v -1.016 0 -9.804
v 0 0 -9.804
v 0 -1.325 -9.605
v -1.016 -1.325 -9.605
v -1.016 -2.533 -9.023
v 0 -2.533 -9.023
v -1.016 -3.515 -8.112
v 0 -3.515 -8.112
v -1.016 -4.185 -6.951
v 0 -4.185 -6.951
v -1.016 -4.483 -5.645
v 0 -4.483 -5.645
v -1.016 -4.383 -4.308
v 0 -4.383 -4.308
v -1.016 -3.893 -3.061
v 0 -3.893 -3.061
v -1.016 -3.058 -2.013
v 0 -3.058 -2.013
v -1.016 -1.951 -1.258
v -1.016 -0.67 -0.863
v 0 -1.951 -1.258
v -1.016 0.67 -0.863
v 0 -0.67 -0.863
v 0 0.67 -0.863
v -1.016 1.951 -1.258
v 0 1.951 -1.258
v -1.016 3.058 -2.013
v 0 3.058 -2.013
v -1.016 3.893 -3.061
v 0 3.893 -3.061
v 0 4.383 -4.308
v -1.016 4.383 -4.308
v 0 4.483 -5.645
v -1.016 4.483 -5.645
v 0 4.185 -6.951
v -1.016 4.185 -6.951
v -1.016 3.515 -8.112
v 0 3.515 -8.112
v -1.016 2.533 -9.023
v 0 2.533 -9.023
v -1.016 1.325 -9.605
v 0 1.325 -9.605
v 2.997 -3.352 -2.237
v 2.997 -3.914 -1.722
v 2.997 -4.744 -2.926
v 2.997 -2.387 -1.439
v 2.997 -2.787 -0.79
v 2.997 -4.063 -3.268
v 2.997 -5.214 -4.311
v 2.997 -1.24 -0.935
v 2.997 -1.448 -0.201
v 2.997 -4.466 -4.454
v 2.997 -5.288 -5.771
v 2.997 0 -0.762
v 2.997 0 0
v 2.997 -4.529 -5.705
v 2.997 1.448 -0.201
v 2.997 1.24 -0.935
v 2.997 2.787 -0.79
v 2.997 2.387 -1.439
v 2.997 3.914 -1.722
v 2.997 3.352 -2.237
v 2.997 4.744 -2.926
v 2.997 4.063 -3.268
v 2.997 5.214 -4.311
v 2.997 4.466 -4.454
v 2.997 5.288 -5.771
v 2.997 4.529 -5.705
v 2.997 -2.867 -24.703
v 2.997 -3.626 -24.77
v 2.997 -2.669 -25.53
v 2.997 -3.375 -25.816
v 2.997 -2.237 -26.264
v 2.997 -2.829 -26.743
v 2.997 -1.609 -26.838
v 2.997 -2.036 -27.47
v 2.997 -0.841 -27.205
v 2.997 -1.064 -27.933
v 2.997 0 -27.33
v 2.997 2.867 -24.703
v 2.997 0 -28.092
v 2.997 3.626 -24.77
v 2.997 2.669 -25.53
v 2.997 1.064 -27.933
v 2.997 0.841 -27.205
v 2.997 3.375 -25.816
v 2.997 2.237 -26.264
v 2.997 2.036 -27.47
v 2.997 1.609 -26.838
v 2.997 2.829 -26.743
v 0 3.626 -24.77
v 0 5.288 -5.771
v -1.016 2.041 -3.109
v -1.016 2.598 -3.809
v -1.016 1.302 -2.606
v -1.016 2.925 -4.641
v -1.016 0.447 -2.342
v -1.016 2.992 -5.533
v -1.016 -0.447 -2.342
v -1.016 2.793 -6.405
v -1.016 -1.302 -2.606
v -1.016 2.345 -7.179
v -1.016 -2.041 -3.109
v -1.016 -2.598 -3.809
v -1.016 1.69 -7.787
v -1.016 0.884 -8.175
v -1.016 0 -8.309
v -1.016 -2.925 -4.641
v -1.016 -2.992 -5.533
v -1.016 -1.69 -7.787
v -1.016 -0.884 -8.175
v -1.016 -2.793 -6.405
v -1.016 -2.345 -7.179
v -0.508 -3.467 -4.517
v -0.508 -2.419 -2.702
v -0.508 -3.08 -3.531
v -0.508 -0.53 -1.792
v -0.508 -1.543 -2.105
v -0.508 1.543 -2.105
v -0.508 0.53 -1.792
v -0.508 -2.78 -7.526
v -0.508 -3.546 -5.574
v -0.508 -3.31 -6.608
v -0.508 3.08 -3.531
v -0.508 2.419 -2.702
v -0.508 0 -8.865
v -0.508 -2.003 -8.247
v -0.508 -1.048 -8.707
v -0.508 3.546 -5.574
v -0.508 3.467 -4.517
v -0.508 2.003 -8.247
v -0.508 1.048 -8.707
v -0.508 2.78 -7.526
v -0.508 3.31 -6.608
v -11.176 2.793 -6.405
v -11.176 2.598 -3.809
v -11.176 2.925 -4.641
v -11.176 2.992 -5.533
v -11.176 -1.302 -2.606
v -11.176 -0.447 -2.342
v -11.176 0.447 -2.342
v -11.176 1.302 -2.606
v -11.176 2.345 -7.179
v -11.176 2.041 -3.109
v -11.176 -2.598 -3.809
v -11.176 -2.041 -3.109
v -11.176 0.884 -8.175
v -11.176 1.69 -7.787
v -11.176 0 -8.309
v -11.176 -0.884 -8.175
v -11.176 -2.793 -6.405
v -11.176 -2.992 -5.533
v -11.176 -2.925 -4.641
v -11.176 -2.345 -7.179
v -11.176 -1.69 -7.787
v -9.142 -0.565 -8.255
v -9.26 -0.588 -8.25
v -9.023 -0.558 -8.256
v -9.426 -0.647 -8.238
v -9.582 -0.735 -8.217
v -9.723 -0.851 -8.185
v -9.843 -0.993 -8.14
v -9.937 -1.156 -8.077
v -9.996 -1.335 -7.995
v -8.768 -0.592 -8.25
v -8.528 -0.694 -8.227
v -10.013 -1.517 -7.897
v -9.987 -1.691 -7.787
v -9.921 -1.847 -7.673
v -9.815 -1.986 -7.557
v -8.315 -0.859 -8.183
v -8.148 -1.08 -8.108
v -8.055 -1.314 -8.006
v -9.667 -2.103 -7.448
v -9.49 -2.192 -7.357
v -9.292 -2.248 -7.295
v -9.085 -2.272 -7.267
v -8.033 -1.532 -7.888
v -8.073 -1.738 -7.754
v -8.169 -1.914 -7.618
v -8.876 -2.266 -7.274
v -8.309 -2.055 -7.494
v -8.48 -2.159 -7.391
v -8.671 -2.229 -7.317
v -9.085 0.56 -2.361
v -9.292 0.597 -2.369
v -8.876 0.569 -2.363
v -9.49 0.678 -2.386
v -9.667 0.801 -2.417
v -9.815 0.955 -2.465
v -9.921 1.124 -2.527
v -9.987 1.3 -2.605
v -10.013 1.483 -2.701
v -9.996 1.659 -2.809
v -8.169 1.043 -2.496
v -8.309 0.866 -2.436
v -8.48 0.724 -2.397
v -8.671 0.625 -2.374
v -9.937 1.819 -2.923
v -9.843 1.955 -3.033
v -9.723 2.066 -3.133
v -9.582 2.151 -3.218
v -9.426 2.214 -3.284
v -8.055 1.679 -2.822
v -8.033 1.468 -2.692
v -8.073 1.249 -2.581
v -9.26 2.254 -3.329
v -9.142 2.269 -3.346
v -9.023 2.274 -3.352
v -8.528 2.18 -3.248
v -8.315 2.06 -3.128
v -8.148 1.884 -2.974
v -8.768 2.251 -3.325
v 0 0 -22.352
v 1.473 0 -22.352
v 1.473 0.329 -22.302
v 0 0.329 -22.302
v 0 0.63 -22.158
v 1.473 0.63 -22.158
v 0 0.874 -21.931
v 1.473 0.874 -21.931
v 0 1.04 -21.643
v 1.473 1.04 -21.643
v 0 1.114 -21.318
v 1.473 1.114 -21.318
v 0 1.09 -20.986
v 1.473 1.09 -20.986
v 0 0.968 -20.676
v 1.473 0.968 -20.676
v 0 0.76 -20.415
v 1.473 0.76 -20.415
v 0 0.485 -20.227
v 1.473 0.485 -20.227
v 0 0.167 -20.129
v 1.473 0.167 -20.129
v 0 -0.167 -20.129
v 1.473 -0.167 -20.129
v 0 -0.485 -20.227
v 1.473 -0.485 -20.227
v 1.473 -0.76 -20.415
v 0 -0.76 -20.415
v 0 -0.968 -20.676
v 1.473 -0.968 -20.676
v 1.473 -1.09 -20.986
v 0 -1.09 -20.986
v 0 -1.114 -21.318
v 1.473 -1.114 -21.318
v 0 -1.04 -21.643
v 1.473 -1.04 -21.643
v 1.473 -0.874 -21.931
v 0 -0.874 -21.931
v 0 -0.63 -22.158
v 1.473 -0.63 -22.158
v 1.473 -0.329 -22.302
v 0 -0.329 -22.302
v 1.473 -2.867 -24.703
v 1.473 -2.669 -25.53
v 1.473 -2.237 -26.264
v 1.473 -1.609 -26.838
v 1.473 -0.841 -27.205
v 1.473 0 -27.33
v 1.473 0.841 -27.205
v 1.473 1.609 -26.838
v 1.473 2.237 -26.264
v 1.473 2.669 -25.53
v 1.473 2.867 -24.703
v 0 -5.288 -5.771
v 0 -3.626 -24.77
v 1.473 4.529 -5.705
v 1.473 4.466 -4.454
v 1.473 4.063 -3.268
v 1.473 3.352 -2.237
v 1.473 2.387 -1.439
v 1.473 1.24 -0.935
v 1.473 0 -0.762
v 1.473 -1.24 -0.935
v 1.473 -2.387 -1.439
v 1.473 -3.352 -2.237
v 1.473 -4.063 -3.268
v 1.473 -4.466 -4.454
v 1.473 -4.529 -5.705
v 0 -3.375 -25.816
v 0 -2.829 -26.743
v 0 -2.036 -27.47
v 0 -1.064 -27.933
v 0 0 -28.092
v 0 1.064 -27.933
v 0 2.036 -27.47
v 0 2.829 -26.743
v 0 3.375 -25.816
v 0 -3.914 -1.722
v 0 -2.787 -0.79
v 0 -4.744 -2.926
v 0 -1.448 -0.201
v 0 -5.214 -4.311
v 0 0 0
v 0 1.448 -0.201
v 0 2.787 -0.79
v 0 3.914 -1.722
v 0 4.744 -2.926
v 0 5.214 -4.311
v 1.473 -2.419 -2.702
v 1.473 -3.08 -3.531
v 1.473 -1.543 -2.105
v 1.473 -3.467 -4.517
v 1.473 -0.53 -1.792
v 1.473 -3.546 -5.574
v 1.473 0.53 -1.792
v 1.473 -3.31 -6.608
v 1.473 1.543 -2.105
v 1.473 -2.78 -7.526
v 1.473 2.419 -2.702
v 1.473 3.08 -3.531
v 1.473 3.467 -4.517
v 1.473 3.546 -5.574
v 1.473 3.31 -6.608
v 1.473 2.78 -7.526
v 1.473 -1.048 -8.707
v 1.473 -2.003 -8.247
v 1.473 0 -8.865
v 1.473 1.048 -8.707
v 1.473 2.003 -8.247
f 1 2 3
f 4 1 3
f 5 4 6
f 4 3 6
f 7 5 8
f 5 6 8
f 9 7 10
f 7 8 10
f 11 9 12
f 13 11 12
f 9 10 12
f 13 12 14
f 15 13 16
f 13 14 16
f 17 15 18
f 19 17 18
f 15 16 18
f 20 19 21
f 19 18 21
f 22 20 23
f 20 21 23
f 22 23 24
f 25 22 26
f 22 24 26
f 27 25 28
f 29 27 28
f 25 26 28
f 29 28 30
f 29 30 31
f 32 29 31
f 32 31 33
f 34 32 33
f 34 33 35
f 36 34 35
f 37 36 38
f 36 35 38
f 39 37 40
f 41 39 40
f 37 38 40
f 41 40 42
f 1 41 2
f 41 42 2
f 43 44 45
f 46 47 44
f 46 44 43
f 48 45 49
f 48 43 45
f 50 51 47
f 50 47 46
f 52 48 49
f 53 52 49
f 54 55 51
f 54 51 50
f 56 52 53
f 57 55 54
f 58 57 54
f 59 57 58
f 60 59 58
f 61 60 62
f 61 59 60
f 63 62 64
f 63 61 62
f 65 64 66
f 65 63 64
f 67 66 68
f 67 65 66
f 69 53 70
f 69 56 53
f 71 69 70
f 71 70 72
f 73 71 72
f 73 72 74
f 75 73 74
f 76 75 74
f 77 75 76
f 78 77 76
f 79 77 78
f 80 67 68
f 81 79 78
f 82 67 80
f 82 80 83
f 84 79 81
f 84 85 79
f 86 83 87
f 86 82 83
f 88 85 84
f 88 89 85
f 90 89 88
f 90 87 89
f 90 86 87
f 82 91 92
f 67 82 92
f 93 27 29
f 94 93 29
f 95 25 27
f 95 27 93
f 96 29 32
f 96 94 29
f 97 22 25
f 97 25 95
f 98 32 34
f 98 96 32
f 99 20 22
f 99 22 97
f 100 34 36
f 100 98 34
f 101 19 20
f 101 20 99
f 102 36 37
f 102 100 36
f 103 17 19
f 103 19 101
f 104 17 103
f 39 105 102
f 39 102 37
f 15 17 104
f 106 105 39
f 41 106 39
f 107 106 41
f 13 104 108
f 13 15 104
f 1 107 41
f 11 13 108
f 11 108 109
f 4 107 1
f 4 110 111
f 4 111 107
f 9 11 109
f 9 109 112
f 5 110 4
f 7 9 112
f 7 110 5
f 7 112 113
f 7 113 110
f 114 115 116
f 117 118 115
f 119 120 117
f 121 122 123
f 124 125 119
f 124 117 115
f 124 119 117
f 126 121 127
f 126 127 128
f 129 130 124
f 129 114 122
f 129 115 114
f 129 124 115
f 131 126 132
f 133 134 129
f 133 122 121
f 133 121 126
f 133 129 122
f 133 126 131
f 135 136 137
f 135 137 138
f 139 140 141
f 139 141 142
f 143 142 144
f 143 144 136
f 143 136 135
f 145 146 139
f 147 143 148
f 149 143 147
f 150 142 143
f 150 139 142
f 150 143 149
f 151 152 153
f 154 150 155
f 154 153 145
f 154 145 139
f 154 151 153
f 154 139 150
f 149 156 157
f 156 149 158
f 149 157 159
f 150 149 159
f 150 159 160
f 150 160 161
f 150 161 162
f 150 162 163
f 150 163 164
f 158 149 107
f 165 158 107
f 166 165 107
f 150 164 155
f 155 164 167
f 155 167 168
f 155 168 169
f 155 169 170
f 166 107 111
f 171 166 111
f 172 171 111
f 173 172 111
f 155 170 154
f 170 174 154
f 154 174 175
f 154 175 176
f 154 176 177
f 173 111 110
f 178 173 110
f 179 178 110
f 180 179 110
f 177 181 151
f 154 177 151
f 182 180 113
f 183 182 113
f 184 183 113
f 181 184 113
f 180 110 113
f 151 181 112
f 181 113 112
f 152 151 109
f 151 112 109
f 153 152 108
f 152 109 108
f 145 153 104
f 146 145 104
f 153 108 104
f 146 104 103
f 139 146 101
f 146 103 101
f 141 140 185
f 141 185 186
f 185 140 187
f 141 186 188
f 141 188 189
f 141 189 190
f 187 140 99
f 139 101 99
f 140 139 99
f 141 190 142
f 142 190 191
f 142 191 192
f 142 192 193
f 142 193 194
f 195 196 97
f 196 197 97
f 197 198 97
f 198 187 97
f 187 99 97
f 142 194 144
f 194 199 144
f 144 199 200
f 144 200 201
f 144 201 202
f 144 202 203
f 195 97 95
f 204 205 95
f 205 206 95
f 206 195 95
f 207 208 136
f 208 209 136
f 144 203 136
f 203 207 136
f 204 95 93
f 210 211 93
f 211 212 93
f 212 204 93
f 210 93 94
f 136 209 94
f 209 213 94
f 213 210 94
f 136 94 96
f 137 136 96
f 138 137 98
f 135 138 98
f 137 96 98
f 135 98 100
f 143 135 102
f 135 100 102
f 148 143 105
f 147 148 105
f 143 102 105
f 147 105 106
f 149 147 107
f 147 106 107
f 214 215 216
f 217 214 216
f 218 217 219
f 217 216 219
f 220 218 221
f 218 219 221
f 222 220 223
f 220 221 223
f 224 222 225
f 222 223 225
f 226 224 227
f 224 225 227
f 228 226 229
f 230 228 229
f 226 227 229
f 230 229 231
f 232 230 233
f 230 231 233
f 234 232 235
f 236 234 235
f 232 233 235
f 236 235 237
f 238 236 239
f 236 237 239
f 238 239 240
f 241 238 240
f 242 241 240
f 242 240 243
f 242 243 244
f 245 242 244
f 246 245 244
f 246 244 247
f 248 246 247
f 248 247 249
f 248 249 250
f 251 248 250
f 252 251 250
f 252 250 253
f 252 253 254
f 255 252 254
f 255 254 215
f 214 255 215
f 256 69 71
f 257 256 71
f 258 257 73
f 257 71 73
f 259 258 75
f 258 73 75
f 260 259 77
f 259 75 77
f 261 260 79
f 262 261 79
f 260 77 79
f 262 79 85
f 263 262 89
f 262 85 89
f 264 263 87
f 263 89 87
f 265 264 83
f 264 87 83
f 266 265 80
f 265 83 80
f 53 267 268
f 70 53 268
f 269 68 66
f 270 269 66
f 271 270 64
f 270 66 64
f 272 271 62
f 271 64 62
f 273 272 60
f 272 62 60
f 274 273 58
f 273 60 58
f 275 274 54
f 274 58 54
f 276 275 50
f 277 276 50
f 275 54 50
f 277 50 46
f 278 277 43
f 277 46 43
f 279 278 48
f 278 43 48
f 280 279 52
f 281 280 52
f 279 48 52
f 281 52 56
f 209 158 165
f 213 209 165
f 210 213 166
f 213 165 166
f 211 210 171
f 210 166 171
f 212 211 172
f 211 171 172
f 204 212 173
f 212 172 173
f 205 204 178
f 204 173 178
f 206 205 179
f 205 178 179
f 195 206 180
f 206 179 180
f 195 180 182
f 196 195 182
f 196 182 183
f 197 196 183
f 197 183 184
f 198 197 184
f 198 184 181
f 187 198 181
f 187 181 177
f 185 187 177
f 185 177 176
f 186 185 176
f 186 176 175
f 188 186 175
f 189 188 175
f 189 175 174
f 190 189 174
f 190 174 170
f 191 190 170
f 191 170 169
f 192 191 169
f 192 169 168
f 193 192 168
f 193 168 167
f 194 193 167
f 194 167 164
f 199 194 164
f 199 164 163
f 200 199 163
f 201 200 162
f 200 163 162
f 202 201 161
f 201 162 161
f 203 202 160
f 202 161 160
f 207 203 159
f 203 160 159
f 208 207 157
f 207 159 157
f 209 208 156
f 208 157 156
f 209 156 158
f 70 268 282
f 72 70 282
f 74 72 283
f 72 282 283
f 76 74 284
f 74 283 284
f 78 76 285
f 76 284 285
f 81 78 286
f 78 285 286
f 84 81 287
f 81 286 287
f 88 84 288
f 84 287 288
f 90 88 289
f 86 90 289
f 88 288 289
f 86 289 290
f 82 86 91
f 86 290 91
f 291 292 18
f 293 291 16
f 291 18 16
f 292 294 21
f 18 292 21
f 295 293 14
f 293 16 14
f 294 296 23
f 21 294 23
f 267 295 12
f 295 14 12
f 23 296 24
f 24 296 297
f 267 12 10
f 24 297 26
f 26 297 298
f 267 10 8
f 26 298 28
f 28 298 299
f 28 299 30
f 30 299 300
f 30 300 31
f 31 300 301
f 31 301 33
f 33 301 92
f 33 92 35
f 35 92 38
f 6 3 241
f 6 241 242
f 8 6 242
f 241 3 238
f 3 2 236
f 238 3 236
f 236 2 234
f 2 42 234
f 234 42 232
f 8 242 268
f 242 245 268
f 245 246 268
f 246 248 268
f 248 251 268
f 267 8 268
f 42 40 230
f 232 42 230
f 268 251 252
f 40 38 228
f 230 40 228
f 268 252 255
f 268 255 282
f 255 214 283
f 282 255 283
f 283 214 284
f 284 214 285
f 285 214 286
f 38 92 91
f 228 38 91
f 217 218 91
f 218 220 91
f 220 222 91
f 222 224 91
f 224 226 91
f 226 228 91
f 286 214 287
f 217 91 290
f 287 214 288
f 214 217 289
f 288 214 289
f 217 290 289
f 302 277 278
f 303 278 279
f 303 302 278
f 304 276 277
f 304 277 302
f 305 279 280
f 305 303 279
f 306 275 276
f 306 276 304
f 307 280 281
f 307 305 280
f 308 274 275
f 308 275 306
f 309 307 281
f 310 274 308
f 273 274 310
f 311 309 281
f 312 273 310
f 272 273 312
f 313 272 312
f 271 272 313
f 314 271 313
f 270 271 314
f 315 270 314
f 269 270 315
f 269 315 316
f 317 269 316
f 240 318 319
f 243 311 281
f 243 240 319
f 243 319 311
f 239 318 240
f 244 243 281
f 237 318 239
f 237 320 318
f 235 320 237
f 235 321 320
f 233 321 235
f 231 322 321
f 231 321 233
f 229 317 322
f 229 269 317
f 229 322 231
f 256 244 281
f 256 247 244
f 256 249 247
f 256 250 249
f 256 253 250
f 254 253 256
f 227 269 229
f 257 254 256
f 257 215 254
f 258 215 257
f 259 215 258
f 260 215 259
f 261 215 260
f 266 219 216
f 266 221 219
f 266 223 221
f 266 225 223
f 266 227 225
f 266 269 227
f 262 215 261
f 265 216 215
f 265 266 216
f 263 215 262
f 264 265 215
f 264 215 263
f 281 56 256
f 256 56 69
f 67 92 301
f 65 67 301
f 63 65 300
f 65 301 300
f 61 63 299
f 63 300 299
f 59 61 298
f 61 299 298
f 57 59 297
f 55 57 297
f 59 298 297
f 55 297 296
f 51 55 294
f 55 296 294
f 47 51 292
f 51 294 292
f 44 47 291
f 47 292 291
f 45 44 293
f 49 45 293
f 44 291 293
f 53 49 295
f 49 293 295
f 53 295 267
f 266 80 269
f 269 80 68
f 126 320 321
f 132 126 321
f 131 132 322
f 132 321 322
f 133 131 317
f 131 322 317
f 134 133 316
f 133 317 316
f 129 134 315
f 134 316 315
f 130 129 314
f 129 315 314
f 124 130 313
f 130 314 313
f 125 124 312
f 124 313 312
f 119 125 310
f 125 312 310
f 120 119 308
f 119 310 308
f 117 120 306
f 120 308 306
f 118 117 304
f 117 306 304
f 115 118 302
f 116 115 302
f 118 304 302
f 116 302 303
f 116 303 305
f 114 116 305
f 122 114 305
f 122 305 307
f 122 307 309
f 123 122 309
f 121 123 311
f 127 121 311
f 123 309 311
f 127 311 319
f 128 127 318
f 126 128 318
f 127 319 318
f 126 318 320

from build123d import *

# Parameters (mm, degrees)
BOSS_EXTRUDE1_DEPTH = 2.9972
SKETCH2_R           = 3
BOSS_EXTRUDE2_DEPTH = 11.176
SKETCH3_R           = 4.4958
BOSS_EXTRUDE3_DEPTH = 1.016
CUT_EXTRUDE1_DEPTH  = 1.524
SKETCH5_R           = 3.556
CUT_EXTRUDE2_DEPTH  = 1.9812
SKETCH6_R           = 1.1176
CUT_EXTRUDE3_DEPTH  = 32.262860272
SKETCH9_R           = 0.9906
CUT_EXTRUDE4_DEPTH  = 10.16


with BuildPart() as part:
    # Sketch1 → Boss-Extrude1 (new body)
    with BuildSketch(Plane(origin=(0, 0, 0), x_dir=(0, 0, -1), z_dir=(1, 0, 0))):
        with BuildLine():
            Line((24.769539012, 3.626266444), (5.771274976, 5.288399174))
            ThreePointArc((5.771274976, 5.288399174), (0, 0), (5.771274976, -5.288399174))
            Line((5.771274976, -5.288399174), (24.769539012, -3.626266444))
            ThreePointArc((24.769539012, -3.626266444), (28.0924, 0), (24.769539012, 3.626266444))
        make_face()
    extrude(amount=BOSS_EXTRUDE1_DEPTH)

    # Sketch2 → Boss-Extrude2 (add)
    with BuildSketch(Plane.ZY):
        with Locations(Location((-5.3086, 0, 0), (0, 0, 180))):
            Circle(SKETCH2_R)
    extrude(amount=BOSS_EXTRUDE2_DEPTH)

    # Sketch3 → Boss-Extrude3 (add)
    with BuildSketch(Plane.ZY):
        with Locations(Location((-5.3086, 0, 0), (0, 0, 180))):
            Circle(SKETCH3_R)
    extrude(amount=BOSS_EXTRUDE3_DEPTH)

    # Sketch4 → Cut-Extrude1 (cut)
    with BuildSketch(Plane(origin=(2.9972, 0, 0), x_dir=(0, 0, -1), z_dir=(1, 0, 0))):
        with BuildLine():
            Line((24.703126336, 2.867166085), (5.7048623, 4.529298814))
            ThreePointArc((5.7048623, 4.529298814), (0.762, 0), (5.7048623, -4.529298814))
            Line((5.7048623, -4.529298814), (24.703126336, -2.867166085))
            ThreePointArc((24.703126336, -2.867166085), (27.3304, 0), (24.703126336, 2.867166085))
        make_face()
    extrude(amount=-CUT_EXTRUDE1_DEPTH, mode=Mode.SUBTRACT)

    # Sketch5 → Cut-Extrude2 (cut)
    with BuildSketch(Plane(origin=(1.4732, 0, 0), x_dir=(0, 0, -1), z_dir=(1, 0, 0))):
        with Locations((5.3086, 0)):
            Circle(SKETCH5_R)
    extrude(amount=-CUT_EXTRUDE2_DEPTH, mode=Mode.SUBTRACT)

    # Sketch6 → Cut-Extrude3 (cut, through all)
    with BuildSketch(Plane(origin=(1.4732, 0, 0), x_dir=(0, 0, -1), z_dir=(1, 0, 0))):
        with Locations((21.2344, 0)):
            Circle(SKETCH6_R)
    extrude(amount=-CUT_EXTRUDE3_DEPTH, mode=Mode.SUBTRACT)

    # Sketch9 → Cut-Extrude4 (cut)
    with BuildSketch(Plane(origin=(0, -4.097011229, -7.096231608), x_dir=(-1, 0, 0), z_dir=(0, -0.500000000000004, -0.8660254037844363))):
        with Locations(Location((9.022814295, 2.6543, 0), (0, 0, 90))):
            Circle(SKETCH9_R)
    extrude(amount=-CUT_EXTRUDE4_DEPTH, mode=Mode.SUBTRACT)


solid = part.part
